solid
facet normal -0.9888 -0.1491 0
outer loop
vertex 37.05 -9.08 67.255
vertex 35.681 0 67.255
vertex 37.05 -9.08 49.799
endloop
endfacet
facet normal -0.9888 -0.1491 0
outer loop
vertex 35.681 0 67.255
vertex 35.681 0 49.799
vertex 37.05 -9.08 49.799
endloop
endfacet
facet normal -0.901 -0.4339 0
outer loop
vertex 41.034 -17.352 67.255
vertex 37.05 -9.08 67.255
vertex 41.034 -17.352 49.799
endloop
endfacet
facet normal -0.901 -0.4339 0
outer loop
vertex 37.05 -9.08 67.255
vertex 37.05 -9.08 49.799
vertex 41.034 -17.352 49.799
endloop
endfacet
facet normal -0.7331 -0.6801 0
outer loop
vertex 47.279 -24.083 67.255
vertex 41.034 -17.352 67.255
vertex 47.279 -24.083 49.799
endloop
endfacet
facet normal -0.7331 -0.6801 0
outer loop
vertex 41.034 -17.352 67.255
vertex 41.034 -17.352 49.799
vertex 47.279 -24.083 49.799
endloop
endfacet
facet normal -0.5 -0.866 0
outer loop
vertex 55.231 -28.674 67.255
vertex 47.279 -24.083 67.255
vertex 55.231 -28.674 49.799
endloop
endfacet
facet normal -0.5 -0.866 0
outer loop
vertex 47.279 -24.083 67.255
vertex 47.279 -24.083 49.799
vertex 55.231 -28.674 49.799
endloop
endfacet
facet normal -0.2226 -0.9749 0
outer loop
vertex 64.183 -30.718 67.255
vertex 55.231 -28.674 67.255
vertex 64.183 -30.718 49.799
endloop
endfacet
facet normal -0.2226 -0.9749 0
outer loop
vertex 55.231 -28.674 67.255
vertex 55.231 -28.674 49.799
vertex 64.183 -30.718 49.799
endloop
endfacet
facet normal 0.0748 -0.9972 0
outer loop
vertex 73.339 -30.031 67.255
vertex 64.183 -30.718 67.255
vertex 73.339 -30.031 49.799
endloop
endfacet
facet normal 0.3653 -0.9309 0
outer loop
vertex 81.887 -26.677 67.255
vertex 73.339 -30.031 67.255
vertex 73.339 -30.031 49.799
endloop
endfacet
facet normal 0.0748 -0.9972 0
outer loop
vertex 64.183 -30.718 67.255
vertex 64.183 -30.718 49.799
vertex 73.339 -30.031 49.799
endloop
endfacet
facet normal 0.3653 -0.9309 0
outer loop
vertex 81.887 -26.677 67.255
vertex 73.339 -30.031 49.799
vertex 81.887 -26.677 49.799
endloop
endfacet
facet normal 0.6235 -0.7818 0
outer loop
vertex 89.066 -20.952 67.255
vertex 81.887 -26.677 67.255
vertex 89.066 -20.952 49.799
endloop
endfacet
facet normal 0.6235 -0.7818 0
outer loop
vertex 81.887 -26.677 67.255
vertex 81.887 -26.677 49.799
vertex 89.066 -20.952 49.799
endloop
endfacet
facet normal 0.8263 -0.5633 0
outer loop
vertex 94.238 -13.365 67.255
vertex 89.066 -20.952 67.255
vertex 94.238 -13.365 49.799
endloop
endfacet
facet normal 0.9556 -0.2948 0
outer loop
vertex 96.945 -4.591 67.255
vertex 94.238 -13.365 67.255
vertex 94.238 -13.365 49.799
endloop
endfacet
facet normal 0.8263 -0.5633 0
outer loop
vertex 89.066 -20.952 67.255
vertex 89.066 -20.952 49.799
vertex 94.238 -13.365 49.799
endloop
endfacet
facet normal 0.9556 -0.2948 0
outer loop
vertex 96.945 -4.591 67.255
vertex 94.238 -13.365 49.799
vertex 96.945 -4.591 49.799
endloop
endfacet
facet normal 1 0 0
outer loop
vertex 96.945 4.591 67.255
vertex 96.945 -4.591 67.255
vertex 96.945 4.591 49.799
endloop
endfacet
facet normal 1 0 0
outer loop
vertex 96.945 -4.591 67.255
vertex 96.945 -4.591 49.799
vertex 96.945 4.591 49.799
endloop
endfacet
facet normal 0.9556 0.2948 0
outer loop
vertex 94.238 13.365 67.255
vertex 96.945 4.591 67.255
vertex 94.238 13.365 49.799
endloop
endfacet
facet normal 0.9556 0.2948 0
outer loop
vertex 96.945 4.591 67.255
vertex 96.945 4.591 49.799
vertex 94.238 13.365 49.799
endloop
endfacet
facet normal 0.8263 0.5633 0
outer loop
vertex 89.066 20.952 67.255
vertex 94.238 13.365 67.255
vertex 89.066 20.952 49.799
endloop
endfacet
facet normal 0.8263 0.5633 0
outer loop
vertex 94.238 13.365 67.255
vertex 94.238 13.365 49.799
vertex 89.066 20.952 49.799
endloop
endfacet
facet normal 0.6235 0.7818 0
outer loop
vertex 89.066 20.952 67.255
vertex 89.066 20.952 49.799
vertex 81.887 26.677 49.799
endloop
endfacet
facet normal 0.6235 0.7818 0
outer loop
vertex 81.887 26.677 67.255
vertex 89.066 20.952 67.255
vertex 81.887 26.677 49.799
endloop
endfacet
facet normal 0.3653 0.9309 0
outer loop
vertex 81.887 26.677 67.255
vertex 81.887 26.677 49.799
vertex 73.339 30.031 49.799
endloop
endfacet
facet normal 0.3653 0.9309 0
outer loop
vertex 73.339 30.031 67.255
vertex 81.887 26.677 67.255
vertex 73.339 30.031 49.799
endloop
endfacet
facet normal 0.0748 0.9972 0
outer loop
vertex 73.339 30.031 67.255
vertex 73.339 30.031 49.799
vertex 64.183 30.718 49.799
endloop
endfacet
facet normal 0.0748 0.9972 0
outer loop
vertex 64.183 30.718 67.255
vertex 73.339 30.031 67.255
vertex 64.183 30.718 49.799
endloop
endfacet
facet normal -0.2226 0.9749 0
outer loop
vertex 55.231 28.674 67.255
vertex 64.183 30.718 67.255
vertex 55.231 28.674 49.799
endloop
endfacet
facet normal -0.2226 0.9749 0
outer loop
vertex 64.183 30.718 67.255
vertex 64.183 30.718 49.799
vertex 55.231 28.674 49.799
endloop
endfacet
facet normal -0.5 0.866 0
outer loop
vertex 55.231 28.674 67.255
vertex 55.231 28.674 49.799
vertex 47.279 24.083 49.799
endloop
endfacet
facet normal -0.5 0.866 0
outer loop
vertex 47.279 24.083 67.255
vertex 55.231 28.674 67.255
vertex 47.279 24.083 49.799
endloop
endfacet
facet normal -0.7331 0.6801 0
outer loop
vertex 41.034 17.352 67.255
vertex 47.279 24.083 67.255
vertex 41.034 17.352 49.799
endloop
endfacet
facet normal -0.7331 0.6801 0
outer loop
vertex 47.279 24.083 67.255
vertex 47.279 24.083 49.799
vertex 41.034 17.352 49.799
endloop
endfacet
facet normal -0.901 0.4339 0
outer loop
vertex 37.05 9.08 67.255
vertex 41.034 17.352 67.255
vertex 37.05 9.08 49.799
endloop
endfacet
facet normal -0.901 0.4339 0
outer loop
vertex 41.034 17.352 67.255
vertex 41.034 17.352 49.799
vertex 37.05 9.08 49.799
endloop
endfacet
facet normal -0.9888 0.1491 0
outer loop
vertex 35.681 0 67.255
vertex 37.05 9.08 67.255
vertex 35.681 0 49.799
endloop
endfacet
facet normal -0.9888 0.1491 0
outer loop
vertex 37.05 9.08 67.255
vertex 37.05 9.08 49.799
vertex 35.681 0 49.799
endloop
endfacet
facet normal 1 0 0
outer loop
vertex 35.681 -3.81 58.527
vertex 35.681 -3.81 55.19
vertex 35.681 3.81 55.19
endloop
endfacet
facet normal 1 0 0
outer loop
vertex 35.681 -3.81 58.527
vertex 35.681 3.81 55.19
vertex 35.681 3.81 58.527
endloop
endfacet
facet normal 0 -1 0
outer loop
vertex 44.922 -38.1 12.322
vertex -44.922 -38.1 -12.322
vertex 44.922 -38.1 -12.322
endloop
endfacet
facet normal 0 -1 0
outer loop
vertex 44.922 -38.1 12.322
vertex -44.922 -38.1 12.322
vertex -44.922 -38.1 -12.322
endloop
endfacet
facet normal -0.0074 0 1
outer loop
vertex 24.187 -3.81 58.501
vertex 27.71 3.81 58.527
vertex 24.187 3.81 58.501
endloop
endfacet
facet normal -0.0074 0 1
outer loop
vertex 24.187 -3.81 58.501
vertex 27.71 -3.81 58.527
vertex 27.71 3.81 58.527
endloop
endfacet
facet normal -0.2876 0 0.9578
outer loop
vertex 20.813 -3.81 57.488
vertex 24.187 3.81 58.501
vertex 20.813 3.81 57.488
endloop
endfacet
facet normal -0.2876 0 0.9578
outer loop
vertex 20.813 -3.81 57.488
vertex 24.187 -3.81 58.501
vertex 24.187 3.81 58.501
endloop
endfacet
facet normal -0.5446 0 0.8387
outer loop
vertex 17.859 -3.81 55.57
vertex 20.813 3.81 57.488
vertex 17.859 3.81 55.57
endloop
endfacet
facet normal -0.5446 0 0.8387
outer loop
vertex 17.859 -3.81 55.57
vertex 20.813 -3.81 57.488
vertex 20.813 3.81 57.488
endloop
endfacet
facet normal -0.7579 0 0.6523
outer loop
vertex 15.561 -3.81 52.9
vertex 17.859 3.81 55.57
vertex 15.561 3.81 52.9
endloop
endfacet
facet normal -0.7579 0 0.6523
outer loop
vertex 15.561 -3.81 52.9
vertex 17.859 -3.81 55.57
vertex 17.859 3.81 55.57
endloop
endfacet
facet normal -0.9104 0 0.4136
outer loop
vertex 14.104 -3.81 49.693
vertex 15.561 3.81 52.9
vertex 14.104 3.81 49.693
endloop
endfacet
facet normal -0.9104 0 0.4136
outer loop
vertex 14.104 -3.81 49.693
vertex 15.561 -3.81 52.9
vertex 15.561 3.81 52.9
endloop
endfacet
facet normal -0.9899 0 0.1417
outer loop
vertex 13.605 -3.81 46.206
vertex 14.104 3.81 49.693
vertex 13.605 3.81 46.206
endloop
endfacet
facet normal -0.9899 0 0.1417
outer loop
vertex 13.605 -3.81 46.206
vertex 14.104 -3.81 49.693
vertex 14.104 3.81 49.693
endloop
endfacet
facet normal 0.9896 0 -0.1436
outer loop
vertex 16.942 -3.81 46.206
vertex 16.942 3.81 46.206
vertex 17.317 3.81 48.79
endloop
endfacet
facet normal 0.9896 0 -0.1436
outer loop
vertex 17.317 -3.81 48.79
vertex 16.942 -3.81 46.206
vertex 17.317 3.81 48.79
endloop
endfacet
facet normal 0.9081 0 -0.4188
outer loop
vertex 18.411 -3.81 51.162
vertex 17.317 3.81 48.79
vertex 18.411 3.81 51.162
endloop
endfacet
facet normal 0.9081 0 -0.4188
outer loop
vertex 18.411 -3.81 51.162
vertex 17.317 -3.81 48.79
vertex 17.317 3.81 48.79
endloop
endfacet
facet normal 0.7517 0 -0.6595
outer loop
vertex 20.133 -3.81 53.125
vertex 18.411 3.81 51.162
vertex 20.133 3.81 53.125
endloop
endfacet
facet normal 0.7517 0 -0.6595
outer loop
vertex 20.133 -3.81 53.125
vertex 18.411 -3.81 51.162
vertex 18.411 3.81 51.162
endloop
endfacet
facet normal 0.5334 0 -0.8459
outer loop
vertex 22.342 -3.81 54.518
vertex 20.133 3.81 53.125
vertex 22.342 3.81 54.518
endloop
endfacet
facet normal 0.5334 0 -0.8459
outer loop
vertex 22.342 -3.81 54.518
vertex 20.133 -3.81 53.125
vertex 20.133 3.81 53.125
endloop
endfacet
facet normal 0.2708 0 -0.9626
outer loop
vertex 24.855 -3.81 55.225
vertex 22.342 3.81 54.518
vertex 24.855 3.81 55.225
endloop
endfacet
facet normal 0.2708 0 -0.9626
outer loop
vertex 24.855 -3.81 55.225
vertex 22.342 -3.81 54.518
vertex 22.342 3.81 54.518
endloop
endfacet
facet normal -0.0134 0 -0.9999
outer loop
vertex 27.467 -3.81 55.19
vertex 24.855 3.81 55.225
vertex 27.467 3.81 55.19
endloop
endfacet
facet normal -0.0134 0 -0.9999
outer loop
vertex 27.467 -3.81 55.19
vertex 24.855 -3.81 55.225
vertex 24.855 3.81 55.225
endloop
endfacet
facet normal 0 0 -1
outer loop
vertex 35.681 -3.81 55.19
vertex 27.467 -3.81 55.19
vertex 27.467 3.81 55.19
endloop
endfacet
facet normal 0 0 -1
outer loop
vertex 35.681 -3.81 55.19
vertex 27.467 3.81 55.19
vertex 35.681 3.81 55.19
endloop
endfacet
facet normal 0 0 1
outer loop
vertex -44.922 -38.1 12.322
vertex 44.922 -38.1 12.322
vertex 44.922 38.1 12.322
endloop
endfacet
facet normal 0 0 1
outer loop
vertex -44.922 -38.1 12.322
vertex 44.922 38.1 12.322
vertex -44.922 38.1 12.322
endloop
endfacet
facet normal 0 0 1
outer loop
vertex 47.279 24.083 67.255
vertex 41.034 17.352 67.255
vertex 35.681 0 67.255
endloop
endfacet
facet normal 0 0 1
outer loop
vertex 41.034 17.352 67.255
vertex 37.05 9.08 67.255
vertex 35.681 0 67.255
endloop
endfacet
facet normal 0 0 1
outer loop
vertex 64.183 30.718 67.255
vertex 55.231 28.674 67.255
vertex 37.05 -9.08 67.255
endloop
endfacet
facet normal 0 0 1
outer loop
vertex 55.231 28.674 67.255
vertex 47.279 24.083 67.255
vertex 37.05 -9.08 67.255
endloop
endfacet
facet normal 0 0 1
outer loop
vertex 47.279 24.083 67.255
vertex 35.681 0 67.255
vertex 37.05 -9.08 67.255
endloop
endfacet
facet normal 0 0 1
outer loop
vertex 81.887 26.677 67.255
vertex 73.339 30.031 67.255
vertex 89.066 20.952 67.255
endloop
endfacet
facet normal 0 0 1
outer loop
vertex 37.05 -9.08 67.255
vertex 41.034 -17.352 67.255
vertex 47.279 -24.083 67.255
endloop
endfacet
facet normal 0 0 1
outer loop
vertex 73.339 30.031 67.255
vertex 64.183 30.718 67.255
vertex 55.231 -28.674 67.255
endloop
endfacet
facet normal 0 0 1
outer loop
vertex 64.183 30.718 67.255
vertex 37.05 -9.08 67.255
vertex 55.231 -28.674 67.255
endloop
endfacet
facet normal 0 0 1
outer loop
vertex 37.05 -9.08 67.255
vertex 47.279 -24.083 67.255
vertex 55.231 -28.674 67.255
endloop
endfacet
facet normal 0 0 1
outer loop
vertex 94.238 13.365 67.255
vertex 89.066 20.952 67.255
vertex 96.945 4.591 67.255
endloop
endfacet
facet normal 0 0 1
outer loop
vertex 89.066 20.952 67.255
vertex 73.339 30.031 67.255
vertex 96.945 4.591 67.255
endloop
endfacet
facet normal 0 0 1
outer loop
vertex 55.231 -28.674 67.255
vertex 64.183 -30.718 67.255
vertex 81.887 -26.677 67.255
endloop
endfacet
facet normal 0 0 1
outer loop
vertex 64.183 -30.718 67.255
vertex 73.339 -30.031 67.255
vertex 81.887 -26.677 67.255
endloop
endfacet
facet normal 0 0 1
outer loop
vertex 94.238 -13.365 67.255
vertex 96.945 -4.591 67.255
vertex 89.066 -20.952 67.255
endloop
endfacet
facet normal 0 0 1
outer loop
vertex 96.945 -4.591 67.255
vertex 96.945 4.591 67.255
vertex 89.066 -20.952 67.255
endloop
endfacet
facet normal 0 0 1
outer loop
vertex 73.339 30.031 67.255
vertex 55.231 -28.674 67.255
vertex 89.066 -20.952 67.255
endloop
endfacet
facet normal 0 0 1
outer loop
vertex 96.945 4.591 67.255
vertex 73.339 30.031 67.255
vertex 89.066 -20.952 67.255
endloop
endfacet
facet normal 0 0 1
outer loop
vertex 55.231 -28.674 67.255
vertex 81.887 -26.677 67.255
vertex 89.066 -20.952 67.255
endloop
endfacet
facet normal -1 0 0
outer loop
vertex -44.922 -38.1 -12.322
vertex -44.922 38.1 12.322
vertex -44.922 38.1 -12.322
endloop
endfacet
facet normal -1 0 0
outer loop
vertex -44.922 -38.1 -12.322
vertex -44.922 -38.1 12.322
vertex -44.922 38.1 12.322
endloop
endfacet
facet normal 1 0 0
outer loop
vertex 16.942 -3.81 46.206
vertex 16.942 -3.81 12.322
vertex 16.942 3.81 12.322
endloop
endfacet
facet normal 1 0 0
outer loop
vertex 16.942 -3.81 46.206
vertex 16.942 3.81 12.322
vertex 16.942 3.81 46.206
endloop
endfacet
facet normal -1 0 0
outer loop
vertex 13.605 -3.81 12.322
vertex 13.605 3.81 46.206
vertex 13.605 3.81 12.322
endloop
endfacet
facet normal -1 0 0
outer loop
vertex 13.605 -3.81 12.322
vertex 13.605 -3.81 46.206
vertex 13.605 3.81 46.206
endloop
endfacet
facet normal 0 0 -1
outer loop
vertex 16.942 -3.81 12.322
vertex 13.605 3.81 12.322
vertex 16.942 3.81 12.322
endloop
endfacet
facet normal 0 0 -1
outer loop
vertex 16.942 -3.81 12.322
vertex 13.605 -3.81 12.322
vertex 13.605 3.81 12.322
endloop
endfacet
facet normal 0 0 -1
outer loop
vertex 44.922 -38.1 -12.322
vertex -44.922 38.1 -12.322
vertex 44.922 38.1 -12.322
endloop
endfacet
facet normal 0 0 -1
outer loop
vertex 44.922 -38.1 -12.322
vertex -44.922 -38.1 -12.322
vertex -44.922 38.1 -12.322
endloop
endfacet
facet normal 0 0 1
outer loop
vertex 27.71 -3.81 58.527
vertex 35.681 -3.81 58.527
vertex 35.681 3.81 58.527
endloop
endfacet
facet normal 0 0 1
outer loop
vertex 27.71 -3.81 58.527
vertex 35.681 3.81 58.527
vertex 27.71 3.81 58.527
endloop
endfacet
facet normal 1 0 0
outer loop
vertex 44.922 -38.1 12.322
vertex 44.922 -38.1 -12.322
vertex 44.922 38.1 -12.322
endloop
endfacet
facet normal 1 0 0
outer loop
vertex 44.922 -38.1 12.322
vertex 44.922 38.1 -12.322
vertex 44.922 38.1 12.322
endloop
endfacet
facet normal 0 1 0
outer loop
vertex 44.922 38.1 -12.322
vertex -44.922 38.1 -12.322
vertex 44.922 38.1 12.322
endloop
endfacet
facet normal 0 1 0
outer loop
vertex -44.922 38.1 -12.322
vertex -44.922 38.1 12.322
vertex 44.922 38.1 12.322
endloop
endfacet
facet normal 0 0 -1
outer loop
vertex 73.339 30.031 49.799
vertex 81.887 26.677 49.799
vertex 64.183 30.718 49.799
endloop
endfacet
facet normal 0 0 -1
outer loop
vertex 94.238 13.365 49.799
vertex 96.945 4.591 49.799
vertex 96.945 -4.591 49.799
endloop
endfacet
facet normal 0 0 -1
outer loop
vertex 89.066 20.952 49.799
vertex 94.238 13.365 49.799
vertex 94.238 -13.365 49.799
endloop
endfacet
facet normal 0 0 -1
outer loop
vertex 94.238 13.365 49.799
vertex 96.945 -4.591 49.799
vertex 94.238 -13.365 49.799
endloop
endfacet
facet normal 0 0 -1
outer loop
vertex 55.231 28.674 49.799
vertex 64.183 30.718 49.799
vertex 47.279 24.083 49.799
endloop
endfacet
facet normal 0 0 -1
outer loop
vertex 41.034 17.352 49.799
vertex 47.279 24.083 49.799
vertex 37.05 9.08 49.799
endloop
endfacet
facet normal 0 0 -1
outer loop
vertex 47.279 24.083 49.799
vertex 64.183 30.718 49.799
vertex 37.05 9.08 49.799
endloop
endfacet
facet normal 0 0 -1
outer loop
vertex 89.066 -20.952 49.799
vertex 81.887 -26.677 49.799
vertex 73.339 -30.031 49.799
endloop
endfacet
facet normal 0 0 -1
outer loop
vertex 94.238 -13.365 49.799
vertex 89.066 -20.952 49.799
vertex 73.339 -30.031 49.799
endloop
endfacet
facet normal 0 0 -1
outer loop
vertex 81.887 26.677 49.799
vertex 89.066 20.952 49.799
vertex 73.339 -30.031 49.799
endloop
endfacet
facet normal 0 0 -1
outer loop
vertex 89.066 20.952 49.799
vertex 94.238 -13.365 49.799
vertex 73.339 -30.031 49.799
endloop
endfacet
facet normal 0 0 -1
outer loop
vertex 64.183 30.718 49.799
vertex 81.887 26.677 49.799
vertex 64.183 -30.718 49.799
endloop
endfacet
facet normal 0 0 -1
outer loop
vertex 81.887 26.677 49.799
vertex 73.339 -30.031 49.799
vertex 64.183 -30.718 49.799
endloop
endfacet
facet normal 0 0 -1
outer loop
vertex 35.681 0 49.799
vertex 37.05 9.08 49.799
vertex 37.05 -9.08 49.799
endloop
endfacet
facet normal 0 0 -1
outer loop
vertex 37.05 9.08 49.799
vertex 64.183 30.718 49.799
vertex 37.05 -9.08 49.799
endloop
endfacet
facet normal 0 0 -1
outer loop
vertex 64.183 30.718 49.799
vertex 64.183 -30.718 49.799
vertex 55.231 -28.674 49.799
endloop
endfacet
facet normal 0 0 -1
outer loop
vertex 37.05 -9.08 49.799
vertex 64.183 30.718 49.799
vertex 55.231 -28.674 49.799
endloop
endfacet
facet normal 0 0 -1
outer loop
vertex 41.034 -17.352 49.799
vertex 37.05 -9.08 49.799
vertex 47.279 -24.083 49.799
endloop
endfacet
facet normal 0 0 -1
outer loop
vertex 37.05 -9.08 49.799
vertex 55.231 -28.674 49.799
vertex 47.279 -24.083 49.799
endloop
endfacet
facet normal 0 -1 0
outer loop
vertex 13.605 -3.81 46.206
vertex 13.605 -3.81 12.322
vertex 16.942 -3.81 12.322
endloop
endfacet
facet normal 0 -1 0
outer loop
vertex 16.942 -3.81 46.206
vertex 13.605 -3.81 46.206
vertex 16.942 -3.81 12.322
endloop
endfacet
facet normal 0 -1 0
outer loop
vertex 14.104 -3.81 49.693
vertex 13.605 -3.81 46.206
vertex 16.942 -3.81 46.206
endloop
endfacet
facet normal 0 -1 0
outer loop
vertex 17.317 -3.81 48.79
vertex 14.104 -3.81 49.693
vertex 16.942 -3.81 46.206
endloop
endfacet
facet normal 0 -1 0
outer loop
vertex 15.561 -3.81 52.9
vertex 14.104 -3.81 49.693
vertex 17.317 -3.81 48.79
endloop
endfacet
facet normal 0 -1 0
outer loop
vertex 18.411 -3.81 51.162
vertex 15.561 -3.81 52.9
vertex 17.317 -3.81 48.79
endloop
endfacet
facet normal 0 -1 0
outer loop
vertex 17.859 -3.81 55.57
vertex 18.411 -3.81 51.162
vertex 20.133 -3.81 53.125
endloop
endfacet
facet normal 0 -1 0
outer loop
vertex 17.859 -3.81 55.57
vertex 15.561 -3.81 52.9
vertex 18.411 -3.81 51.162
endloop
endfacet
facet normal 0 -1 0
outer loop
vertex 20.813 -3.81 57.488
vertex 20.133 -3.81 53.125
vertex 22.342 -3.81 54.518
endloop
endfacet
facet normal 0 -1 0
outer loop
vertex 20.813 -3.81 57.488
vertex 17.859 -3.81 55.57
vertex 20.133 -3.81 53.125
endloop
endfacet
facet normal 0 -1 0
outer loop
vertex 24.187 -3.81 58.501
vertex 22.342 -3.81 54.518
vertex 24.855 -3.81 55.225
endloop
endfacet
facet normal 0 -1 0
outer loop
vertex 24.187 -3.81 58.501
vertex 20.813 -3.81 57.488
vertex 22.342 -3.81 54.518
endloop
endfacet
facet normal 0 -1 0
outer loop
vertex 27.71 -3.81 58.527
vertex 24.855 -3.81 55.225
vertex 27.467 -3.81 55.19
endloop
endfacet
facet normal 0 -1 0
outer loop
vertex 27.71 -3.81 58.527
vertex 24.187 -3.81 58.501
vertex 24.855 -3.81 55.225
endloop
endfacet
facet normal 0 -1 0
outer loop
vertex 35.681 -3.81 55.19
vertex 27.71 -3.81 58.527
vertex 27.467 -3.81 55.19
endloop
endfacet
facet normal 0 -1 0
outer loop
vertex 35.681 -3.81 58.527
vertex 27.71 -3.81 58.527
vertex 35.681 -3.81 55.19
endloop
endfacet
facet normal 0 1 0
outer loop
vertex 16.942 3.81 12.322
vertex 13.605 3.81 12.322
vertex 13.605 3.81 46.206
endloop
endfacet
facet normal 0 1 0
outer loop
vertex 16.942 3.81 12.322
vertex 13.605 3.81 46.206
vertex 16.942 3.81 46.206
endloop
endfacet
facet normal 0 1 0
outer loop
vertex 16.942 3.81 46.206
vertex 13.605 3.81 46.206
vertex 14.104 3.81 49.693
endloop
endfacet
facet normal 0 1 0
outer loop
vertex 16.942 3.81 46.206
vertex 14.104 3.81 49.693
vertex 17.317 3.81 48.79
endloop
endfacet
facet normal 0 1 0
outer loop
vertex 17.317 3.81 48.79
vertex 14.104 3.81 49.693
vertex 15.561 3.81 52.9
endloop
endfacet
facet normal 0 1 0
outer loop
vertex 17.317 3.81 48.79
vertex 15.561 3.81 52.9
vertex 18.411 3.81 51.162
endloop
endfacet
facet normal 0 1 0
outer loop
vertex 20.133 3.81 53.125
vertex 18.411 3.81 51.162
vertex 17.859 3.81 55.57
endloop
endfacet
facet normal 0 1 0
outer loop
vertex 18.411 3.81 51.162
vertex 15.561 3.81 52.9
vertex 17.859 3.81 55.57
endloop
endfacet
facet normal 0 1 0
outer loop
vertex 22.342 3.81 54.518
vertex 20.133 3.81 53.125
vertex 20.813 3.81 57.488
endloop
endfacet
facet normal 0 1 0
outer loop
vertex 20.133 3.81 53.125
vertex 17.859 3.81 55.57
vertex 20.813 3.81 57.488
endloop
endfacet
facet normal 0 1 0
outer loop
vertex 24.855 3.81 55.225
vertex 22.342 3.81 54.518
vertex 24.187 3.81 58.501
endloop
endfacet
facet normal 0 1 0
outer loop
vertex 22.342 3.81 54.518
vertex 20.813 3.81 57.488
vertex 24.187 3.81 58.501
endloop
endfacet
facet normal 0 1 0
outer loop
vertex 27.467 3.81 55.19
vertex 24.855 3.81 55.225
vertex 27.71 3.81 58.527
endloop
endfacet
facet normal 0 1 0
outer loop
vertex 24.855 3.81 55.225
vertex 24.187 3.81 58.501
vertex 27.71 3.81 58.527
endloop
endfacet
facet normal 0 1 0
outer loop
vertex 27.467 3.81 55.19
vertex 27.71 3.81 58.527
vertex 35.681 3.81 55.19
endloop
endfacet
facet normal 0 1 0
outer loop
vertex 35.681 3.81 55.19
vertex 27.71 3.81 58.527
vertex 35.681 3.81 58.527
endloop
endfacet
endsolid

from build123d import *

# Parameters (mm, degrees)
F1_DEPTH = 38.1
F3_DEPTH = 3.81


with BuildPart() as f1:
    # F0 (on Front) → F1 (new body, symmetric)
    with BuildSketch(Plane.XZ):
        Polygon((-44.922192, -12.321512), (44.922192, -12.321512), (44.922192, 12.321512), (16.942086, 12.321512), (13.605004, 12.321512), (-44.922192, 12.321512), align=None)
    extrude(amount=F1_DEPTH, both=True)


with BuildPart() as f2:
    # F0 (on Front) → F2 (revolve)
    with BuildSketch(Plane.XZ):
        Polygon((35.681047, 58.527198), (35.681047, 55.190116), (35.681047, 49.799457), (66.484846, 49.799457), (66.484846, 67.254938), (35.681047, 67.254938), align=None)
    revolve(axis=Axis((66.484846, 0, 58.527198), (0, 0, 1)))


with BuildPart() as f3:
    # F0 (on Front) → F3 (new body, symmetric)
    with BuildSketch(Plane.XZ):
        with BuildLine():
            Line((13.605004, 12.321512), (16.942086, 12.321512))
            Line((16.942086, 12.321512), (16.942086, 46.205681))
            ThreePointArc((16.942086, 46.205681), (20.132794, 53.124638), (27.466714, 55.190116))
            Line((27.466714, 55.190116), (35.681047, 55.190116))
            Line((35.681047, 55.190116), (35.681047, 58.527198))
            Line((35.681047, 58.527198), (27.709519, 58.527198))
            ThreePointArc((27.709519, 58.527198), (17.858729, 55.569936), (13.605004, 46.205681))
            Line((13.605004, 46.205681), (13.605004, 12.321512))
        make_face()
    extrude(amount=F3_DEPTH, both=True)


solid = Compound([f1.part, f2.part, f3.part])
